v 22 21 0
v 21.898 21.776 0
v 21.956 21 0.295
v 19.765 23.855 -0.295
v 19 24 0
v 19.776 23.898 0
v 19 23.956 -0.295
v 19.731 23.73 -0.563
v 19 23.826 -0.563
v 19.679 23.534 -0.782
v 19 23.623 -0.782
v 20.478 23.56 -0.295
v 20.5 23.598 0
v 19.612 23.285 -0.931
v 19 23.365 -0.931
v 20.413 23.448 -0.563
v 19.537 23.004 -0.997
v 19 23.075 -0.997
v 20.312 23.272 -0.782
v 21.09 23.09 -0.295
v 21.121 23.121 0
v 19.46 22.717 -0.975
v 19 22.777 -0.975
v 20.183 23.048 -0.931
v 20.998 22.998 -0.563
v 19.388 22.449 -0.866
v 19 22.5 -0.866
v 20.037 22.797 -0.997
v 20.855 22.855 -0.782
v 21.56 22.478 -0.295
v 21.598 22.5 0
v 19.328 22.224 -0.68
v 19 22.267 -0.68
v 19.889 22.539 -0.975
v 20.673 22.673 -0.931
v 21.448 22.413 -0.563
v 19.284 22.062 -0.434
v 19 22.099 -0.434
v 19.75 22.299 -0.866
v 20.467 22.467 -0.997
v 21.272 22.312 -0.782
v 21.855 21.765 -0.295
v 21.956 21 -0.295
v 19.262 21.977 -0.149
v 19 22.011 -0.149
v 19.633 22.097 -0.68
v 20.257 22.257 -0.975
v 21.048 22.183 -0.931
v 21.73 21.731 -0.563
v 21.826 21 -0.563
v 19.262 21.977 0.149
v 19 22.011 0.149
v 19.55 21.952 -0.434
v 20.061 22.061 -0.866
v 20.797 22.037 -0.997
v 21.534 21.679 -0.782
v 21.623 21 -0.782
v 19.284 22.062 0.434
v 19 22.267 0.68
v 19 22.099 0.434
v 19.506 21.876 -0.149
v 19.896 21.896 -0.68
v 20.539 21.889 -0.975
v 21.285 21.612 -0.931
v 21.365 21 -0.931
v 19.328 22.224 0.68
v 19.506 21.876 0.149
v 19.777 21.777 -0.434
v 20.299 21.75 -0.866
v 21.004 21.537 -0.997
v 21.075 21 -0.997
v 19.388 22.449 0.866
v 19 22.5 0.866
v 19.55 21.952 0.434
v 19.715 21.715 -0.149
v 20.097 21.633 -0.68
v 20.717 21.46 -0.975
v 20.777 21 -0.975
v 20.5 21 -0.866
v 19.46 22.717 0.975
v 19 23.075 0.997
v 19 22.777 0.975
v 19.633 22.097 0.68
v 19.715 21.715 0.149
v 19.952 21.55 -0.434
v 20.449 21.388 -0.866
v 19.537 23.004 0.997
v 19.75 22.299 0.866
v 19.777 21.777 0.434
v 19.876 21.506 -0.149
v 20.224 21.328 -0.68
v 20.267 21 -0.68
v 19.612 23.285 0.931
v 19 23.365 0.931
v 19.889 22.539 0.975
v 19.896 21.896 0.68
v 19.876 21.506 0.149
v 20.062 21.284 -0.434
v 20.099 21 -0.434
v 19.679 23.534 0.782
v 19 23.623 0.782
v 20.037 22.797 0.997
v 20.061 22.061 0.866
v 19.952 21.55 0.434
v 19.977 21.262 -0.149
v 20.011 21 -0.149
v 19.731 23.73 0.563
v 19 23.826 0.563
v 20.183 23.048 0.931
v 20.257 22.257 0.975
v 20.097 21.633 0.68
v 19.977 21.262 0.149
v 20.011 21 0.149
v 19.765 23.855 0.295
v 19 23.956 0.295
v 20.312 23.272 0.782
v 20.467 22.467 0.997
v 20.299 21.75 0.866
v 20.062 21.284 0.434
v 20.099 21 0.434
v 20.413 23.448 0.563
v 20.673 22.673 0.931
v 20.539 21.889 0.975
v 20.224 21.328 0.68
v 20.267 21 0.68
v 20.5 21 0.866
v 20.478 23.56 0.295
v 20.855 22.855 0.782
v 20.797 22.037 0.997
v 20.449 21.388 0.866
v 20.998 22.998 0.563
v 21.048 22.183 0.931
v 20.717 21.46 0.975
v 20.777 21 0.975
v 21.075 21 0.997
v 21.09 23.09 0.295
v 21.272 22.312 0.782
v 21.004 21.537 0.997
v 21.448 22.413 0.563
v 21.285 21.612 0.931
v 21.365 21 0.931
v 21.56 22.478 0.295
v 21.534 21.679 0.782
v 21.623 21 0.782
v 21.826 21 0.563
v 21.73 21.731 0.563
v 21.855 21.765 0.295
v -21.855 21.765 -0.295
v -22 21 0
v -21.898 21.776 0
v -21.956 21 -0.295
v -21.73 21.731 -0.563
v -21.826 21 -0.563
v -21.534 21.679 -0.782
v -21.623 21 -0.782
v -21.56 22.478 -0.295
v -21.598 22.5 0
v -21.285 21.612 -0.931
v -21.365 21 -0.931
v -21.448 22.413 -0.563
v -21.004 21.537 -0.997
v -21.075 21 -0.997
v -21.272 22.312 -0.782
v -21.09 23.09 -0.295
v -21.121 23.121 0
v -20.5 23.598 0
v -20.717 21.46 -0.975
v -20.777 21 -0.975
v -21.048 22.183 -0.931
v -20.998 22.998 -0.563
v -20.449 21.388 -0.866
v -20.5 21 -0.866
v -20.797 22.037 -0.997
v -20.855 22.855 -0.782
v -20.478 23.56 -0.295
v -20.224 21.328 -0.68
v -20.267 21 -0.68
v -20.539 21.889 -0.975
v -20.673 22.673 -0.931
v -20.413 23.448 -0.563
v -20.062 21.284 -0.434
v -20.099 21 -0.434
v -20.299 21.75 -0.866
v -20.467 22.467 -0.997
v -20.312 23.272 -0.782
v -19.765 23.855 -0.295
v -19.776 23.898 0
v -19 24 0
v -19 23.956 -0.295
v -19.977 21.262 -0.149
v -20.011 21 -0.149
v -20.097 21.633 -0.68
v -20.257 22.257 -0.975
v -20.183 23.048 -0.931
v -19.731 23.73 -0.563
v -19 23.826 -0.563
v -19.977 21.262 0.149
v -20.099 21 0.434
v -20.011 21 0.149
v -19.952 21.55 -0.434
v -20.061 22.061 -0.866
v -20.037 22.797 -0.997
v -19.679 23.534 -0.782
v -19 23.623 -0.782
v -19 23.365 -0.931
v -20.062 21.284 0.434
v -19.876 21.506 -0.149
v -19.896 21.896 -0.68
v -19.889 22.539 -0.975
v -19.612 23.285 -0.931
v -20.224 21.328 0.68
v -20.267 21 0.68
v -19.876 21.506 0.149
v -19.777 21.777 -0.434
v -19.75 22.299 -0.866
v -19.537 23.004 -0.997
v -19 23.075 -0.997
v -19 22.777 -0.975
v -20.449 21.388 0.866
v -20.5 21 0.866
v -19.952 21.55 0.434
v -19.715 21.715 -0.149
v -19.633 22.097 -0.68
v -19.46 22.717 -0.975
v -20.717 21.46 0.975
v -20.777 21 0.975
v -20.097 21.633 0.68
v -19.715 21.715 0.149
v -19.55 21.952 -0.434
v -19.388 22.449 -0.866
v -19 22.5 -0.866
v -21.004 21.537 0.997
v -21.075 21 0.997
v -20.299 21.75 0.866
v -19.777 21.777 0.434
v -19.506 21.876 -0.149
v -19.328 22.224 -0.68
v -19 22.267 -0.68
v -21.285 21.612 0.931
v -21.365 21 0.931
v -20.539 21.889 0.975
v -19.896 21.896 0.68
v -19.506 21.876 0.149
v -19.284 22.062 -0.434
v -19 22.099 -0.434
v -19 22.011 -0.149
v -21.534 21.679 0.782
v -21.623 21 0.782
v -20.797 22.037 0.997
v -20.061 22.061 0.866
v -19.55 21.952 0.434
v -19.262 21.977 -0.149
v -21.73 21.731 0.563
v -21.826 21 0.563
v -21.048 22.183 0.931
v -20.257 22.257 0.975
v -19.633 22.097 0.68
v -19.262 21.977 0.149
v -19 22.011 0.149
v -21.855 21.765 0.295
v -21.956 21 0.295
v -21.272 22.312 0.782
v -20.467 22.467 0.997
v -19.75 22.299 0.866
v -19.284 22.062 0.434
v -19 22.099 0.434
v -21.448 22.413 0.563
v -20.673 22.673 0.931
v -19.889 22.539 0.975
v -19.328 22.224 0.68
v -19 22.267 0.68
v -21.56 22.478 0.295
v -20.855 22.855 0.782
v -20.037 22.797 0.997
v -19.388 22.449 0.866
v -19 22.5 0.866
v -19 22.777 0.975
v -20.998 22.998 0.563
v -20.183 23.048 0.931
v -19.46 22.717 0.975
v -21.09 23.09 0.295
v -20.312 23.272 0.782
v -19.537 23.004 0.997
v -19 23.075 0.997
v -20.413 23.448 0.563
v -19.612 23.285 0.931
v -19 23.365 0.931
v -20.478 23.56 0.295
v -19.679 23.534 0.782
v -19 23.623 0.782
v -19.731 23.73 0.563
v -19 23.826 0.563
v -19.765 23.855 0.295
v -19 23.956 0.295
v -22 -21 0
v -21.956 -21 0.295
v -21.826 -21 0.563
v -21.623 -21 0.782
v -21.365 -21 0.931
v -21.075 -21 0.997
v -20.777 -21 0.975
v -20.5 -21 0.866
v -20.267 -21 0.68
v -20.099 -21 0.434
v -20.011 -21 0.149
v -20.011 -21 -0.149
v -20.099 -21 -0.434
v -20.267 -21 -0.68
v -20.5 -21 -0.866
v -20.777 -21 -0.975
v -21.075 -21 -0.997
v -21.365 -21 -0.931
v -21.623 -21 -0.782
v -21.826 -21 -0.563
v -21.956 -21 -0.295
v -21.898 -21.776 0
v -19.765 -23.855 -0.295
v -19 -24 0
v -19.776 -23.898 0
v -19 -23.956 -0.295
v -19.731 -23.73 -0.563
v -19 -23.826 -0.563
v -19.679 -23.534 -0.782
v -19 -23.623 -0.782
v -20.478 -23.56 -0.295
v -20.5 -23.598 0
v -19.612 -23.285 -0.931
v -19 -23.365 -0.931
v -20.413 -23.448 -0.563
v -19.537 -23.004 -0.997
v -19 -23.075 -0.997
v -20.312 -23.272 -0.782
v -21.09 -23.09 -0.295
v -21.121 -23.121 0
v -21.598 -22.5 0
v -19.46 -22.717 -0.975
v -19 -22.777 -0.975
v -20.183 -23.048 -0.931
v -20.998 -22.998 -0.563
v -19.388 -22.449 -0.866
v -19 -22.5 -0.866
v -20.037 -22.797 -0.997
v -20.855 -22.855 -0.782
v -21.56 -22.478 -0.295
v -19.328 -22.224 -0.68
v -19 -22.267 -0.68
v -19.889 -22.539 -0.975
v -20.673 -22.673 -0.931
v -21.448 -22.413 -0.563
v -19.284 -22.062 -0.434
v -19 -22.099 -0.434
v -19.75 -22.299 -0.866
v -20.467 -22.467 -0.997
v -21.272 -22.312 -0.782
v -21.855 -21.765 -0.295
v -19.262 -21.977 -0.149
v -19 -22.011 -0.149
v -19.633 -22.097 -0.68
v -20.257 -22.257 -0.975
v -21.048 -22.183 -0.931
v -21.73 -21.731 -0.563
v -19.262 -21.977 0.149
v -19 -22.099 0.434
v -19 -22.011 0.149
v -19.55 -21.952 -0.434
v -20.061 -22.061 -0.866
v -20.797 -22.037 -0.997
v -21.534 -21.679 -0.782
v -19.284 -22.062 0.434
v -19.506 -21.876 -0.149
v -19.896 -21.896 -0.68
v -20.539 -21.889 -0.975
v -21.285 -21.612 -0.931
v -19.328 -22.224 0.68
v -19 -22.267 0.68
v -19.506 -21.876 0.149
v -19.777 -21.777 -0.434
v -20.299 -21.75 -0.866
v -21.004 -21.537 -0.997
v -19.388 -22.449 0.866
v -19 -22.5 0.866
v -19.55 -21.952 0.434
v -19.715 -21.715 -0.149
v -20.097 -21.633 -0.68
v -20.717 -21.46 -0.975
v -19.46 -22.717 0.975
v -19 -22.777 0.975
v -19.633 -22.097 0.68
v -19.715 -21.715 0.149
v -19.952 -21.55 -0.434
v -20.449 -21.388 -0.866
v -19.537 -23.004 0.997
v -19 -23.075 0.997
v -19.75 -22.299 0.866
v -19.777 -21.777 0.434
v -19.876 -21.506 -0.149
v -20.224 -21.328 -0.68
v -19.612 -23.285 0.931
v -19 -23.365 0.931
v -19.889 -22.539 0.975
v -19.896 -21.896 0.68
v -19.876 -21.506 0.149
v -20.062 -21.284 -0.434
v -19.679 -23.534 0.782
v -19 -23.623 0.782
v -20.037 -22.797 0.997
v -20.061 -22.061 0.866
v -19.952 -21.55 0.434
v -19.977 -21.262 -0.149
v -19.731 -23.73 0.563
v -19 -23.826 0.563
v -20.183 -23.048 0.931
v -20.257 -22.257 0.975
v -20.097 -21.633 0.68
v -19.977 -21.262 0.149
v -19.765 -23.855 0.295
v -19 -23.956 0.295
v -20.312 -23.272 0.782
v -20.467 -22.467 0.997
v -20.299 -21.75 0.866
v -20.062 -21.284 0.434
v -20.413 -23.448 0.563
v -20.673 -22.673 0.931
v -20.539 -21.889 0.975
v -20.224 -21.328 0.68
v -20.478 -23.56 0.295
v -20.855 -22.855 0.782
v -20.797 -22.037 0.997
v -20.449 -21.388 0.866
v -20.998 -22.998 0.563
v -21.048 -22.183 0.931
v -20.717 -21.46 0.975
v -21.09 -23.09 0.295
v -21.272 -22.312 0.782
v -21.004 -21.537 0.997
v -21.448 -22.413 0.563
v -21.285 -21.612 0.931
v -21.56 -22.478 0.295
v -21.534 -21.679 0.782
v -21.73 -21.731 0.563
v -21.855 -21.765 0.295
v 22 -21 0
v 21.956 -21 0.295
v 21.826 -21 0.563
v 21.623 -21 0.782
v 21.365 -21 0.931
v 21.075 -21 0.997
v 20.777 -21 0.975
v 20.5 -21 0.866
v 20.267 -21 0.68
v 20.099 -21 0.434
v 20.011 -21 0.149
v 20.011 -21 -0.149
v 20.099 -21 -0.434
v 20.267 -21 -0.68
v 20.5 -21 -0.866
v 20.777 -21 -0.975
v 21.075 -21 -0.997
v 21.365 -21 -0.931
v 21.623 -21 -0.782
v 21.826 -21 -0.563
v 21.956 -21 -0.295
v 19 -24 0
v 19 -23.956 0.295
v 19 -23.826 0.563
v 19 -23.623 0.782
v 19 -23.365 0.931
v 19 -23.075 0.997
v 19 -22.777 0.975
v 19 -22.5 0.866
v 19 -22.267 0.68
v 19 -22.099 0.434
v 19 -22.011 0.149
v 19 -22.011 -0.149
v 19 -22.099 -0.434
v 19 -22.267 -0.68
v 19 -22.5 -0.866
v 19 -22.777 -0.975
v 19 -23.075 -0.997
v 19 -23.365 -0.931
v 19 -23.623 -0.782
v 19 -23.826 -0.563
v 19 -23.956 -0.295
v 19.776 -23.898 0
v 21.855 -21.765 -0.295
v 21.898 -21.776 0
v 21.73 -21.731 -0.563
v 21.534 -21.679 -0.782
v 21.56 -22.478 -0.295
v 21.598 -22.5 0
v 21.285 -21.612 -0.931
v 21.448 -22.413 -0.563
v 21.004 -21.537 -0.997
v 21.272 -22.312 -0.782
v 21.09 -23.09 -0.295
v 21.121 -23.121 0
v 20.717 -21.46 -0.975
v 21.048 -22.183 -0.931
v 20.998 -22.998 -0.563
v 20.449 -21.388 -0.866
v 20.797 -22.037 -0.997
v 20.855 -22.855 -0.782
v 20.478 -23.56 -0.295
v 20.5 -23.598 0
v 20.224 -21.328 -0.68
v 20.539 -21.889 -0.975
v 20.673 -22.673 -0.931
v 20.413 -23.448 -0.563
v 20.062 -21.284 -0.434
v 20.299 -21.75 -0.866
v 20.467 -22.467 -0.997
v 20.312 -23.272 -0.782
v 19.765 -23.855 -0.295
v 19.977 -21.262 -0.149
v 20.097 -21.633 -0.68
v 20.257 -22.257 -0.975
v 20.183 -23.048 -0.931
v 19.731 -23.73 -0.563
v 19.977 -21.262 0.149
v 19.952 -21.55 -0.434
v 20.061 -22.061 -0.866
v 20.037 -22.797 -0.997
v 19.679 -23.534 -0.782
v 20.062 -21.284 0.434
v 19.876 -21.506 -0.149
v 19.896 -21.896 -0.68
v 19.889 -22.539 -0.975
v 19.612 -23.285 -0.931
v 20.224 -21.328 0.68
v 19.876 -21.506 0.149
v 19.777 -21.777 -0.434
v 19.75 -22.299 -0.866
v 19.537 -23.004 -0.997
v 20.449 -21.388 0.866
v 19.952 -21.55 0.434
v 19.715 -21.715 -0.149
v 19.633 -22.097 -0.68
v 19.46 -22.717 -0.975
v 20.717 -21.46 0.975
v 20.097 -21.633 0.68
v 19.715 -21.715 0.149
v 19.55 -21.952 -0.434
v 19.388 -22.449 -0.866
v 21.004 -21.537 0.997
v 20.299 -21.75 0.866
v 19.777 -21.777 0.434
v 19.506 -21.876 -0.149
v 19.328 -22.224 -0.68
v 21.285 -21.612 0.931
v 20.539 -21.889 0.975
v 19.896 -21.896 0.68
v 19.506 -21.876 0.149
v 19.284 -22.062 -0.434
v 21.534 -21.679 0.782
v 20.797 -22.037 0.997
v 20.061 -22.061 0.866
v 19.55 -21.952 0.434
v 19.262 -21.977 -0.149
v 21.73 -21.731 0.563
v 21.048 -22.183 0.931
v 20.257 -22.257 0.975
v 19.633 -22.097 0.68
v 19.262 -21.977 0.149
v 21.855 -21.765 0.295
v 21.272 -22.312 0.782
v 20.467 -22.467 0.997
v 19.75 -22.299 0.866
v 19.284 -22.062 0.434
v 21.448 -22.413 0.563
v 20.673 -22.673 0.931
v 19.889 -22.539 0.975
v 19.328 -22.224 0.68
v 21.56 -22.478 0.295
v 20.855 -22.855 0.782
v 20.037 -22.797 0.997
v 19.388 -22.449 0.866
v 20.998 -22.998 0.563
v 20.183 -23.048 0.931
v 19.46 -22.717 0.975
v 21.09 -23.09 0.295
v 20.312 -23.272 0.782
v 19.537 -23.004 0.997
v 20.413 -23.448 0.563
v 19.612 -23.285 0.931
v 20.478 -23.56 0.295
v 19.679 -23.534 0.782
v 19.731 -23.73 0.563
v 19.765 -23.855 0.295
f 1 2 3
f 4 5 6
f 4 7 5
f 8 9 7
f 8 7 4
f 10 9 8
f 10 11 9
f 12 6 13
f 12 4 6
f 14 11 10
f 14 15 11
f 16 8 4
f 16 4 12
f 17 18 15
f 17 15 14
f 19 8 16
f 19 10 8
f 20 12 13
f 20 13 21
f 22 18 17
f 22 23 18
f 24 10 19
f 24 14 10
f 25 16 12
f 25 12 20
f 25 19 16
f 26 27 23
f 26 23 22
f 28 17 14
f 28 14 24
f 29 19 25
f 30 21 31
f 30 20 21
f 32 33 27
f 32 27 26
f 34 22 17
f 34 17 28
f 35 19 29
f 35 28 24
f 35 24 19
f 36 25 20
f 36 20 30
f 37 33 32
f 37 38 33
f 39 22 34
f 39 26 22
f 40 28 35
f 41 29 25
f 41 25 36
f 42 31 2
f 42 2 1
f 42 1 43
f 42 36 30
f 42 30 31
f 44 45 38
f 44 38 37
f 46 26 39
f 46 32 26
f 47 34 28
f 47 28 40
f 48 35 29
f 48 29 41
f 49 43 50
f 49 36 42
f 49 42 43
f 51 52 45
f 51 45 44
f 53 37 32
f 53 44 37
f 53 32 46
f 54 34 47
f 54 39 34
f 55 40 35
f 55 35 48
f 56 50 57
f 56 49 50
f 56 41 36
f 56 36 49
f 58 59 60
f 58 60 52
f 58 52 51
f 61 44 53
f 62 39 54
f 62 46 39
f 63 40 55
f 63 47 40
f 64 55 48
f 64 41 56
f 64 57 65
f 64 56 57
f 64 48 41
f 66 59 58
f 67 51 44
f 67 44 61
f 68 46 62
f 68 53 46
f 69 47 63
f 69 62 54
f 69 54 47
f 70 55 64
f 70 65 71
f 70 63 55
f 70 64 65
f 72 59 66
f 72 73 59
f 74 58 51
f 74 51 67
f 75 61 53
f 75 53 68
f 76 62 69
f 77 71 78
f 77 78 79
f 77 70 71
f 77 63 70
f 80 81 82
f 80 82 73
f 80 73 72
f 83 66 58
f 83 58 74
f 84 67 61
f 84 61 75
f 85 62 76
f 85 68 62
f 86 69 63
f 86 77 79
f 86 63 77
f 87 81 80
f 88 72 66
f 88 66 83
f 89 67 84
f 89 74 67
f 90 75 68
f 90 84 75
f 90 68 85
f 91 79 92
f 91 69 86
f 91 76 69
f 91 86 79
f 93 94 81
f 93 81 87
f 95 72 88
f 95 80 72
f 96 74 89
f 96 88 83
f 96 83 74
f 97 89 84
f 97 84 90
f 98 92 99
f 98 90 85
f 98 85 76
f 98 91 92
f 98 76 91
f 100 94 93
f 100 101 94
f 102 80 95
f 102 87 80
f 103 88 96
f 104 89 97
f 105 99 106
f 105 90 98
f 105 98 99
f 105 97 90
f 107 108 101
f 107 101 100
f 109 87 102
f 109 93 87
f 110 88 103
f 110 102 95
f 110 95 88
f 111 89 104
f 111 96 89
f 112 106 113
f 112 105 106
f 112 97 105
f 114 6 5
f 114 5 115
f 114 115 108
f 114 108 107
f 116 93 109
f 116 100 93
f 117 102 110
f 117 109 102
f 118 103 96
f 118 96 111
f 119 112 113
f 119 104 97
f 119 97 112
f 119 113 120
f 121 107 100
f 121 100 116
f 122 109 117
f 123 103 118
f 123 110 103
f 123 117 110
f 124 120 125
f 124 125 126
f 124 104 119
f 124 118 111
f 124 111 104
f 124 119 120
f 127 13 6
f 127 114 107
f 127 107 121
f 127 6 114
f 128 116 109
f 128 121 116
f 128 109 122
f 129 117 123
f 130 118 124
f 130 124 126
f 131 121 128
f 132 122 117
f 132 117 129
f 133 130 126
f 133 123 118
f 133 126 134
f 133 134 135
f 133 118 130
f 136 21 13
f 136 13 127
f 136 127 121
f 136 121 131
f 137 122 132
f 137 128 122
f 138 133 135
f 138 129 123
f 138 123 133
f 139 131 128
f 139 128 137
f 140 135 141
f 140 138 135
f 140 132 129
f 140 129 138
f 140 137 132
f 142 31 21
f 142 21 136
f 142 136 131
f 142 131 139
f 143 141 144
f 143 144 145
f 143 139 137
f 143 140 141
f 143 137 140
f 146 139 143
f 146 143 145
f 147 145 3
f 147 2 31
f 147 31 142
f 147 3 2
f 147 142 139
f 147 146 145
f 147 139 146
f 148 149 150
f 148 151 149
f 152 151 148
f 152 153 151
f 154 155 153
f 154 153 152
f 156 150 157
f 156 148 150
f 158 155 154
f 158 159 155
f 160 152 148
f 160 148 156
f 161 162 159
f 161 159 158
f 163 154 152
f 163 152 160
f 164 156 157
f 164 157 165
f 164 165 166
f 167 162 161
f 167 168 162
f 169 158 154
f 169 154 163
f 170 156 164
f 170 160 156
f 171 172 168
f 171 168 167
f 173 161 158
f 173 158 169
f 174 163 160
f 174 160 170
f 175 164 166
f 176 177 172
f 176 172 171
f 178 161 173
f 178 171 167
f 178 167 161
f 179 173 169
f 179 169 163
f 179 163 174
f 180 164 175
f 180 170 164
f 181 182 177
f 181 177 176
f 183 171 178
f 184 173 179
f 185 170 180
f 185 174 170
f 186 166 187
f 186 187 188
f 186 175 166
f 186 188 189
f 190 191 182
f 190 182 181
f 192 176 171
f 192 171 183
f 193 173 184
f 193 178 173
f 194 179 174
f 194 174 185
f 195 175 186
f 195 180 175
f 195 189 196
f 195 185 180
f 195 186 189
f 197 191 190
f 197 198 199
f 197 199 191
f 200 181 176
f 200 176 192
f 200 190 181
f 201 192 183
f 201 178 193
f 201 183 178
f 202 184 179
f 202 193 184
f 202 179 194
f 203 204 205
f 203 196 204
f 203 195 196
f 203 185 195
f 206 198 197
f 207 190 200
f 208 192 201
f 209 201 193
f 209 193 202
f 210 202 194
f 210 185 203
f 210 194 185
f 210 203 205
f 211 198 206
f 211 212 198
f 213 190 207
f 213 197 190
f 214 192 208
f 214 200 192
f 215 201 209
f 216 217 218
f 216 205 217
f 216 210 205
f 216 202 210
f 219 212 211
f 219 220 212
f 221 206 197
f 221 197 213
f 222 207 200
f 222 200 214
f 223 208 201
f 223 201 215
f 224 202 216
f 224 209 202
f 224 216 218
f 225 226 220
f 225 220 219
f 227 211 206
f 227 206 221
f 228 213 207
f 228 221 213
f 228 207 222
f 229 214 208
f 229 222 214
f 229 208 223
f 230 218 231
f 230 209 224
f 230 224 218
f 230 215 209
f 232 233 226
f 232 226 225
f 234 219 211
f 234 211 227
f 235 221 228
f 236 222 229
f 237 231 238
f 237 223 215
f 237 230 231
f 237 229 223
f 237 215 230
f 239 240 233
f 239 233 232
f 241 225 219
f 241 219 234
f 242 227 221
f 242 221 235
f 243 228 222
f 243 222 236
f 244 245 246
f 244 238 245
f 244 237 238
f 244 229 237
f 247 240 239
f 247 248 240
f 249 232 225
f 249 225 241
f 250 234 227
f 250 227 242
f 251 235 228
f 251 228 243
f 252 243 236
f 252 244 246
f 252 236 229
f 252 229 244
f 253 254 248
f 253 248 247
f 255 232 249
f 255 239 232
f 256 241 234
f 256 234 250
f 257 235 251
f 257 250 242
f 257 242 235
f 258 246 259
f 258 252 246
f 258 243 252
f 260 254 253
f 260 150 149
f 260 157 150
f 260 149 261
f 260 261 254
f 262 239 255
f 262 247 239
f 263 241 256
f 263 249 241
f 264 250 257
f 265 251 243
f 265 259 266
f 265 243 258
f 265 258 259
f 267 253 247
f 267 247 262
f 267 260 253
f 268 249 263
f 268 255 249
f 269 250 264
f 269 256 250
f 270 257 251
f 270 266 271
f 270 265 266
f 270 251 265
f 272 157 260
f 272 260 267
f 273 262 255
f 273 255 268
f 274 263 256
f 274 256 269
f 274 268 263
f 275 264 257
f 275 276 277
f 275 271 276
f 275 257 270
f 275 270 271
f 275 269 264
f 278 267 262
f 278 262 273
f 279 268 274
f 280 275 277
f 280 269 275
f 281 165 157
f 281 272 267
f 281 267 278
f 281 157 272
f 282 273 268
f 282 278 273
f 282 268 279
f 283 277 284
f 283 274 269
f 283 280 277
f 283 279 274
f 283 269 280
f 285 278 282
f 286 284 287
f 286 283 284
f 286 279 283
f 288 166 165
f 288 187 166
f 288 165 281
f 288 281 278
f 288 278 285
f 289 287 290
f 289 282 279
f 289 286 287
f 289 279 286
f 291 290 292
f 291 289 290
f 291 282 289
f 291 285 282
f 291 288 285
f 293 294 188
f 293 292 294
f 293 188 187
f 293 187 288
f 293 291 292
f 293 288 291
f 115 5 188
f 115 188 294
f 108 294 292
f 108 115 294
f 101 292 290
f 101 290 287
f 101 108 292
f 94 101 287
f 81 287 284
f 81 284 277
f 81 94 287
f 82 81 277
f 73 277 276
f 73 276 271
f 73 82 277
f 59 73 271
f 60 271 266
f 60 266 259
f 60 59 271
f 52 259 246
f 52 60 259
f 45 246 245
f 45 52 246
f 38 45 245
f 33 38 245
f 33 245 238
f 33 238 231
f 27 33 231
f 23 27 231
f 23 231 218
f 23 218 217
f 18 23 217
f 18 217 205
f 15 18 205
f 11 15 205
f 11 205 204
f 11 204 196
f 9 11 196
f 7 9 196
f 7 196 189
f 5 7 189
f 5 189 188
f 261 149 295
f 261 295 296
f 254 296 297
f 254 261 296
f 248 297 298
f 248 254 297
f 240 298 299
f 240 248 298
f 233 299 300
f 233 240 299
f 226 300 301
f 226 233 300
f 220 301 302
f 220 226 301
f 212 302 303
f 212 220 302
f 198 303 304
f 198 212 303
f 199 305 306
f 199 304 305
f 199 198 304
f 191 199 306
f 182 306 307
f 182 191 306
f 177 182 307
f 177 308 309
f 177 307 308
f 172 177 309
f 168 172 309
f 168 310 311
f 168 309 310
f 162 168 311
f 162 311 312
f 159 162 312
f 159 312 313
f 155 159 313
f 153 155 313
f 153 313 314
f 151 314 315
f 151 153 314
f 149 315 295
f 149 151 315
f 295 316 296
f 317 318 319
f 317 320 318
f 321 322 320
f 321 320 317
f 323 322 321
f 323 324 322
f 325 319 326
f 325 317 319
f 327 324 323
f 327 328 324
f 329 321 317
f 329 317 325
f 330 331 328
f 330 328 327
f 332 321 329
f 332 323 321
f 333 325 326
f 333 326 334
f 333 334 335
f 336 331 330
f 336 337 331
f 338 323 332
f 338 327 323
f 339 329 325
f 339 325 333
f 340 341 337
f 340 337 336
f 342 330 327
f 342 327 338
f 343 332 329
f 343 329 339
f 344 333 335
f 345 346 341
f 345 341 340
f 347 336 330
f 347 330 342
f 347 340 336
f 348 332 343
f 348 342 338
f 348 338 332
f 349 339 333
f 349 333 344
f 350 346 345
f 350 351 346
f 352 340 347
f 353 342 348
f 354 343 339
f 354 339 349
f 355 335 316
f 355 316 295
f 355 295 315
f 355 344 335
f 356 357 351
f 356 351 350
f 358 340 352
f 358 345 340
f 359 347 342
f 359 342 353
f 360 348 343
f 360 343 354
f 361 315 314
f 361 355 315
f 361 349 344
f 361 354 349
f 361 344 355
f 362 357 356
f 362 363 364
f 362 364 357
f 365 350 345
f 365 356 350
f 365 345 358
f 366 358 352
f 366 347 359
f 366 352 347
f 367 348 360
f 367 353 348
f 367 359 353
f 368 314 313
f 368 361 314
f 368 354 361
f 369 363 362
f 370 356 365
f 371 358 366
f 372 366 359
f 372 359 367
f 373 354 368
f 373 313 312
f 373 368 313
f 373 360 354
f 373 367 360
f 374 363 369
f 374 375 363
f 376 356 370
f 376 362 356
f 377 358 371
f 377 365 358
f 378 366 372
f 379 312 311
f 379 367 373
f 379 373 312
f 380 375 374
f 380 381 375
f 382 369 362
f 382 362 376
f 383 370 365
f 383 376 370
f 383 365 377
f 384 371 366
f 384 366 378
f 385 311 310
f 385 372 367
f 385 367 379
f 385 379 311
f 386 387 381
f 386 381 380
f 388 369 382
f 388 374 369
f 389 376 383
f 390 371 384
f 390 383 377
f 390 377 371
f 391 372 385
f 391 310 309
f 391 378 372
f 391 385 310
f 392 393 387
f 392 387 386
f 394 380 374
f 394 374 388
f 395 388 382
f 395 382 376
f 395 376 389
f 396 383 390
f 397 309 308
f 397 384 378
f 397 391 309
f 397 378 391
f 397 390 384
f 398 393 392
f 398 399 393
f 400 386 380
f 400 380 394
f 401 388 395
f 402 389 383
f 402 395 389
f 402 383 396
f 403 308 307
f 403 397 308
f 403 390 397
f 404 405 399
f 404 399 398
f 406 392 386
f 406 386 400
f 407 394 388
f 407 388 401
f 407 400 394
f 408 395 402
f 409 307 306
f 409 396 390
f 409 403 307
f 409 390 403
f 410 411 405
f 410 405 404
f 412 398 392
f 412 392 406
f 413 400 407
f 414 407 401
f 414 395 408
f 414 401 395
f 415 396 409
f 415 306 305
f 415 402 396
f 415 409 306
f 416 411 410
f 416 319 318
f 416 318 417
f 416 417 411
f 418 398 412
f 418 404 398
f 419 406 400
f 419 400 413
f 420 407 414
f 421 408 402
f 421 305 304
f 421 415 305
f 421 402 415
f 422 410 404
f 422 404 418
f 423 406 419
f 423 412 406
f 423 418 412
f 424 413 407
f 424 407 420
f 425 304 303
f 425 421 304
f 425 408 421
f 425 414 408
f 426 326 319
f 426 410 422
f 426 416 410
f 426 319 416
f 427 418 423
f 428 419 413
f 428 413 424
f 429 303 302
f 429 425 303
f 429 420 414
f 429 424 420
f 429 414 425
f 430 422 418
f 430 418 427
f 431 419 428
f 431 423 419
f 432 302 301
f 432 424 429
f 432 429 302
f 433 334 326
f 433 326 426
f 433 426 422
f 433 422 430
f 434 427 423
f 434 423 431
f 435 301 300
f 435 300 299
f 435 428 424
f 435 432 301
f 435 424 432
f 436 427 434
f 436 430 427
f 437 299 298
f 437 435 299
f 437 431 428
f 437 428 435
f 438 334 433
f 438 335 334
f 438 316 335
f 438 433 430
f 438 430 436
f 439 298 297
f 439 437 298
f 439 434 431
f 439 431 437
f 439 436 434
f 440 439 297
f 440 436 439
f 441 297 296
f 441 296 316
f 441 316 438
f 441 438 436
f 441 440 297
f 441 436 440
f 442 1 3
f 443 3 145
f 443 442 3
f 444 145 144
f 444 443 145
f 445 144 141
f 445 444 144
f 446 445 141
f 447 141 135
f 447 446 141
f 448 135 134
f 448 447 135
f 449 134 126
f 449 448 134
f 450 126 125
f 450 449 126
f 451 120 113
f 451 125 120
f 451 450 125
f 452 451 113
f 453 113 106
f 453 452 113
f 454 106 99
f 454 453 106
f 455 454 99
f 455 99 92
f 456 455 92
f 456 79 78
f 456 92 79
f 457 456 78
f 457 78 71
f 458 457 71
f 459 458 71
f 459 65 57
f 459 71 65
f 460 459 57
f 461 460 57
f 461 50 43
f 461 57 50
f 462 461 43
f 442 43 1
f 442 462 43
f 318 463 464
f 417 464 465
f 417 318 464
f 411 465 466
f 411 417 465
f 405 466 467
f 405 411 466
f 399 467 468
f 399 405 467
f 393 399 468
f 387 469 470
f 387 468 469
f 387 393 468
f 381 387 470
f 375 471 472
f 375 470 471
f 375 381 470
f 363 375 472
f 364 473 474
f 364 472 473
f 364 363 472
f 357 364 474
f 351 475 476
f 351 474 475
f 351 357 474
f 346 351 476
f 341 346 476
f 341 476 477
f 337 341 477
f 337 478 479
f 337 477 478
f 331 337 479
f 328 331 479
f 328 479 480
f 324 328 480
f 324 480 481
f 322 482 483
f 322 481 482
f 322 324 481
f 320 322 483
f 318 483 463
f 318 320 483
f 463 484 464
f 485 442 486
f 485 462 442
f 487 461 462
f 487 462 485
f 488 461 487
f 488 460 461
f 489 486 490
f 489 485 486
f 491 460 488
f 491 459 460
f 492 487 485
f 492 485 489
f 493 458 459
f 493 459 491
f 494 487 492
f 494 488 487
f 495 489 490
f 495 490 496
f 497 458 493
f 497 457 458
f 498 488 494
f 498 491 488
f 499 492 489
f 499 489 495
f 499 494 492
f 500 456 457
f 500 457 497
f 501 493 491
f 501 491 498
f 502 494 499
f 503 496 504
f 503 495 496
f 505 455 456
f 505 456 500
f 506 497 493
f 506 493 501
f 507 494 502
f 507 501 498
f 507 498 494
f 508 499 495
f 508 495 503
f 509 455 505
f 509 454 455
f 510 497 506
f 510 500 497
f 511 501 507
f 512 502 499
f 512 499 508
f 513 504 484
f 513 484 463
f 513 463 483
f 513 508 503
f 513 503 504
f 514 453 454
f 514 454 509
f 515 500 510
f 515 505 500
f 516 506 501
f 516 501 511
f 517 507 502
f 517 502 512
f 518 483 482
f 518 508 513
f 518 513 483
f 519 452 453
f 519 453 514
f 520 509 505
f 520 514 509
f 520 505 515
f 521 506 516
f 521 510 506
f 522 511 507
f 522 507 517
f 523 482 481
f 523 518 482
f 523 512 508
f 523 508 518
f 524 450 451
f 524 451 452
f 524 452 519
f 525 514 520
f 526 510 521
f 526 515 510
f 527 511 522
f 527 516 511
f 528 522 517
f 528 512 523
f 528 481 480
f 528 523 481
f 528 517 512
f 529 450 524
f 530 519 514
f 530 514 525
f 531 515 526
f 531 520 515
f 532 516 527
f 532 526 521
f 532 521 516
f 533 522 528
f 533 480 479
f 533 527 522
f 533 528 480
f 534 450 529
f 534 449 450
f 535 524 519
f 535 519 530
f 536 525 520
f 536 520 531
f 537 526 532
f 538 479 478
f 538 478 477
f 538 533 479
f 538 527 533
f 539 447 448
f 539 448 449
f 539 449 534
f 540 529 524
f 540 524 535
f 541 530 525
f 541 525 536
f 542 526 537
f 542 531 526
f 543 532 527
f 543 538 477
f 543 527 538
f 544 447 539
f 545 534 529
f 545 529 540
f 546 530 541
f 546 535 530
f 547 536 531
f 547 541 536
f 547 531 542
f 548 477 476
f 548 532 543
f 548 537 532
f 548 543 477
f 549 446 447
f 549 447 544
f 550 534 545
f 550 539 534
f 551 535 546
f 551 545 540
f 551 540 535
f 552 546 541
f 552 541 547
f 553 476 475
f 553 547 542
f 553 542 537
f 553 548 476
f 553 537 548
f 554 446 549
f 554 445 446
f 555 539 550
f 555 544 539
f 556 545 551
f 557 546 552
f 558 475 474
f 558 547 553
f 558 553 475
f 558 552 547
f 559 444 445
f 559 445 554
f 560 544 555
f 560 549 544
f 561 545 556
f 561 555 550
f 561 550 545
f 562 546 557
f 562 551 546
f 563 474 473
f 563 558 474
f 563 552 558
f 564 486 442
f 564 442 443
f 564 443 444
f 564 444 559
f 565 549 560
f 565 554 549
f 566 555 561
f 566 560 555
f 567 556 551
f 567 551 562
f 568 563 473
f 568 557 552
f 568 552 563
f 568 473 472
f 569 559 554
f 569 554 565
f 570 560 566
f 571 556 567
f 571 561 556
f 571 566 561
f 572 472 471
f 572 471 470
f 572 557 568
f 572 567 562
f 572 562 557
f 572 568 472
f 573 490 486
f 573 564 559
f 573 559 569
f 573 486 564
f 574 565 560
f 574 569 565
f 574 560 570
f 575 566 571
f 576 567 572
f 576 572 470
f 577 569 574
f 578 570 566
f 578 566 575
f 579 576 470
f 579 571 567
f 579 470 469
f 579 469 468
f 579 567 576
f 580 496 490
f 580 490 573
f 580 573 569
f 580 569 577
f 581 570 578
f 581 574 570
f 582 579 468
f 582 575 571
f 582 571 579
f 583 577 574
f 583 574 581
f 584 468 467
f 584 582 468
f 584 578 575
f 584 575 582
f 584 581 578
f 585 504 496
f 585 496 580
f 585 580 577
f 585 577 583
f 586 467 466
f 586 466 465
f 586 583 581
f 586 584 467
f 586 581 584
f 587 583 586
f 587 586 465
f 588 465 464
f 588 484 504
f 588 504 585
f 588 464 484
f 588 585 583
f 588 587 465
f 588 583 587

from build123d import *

# Parameters (mm, degrees)
ESQUISSE2_R = 1


with BuildPart() as part:
    # Balayage1: sweep along a path in Esquisse1
    with BuildLine(Plane.XY) as balayage1_path:
        Line((-19, 23), (19, 23))
        ThreePointArc((19, 23), (20.414213562, 22.414213562), (21, 21))
        Line((21, 21), (21, -21))
        ThreePointArc((21, -21), (20.414213562, -22.414213562), (19, -23))
        Line((19, -23), (-19, -23))
        ThreePointArc((-19, -23), (-20.414213562, -22.414213562), (-21, -21))
        Line((-21, -21), (-21, 21))
        ThreePointArc((-21, 21), (-20.414213562, 22.414213562), (-19, 23))
    # Esquisse2 → Balayage1 (sweep)
    with BuildSketch(Plane(origin=(0, 0, 0), x_dir=(1, 0, 0), z_dir=(0, 1, 0))):
        with Locations((21, 0)):
            Circle(ESQUISSE2_R)
    sweep(path=balayage1_path.line)


solid = part.part
